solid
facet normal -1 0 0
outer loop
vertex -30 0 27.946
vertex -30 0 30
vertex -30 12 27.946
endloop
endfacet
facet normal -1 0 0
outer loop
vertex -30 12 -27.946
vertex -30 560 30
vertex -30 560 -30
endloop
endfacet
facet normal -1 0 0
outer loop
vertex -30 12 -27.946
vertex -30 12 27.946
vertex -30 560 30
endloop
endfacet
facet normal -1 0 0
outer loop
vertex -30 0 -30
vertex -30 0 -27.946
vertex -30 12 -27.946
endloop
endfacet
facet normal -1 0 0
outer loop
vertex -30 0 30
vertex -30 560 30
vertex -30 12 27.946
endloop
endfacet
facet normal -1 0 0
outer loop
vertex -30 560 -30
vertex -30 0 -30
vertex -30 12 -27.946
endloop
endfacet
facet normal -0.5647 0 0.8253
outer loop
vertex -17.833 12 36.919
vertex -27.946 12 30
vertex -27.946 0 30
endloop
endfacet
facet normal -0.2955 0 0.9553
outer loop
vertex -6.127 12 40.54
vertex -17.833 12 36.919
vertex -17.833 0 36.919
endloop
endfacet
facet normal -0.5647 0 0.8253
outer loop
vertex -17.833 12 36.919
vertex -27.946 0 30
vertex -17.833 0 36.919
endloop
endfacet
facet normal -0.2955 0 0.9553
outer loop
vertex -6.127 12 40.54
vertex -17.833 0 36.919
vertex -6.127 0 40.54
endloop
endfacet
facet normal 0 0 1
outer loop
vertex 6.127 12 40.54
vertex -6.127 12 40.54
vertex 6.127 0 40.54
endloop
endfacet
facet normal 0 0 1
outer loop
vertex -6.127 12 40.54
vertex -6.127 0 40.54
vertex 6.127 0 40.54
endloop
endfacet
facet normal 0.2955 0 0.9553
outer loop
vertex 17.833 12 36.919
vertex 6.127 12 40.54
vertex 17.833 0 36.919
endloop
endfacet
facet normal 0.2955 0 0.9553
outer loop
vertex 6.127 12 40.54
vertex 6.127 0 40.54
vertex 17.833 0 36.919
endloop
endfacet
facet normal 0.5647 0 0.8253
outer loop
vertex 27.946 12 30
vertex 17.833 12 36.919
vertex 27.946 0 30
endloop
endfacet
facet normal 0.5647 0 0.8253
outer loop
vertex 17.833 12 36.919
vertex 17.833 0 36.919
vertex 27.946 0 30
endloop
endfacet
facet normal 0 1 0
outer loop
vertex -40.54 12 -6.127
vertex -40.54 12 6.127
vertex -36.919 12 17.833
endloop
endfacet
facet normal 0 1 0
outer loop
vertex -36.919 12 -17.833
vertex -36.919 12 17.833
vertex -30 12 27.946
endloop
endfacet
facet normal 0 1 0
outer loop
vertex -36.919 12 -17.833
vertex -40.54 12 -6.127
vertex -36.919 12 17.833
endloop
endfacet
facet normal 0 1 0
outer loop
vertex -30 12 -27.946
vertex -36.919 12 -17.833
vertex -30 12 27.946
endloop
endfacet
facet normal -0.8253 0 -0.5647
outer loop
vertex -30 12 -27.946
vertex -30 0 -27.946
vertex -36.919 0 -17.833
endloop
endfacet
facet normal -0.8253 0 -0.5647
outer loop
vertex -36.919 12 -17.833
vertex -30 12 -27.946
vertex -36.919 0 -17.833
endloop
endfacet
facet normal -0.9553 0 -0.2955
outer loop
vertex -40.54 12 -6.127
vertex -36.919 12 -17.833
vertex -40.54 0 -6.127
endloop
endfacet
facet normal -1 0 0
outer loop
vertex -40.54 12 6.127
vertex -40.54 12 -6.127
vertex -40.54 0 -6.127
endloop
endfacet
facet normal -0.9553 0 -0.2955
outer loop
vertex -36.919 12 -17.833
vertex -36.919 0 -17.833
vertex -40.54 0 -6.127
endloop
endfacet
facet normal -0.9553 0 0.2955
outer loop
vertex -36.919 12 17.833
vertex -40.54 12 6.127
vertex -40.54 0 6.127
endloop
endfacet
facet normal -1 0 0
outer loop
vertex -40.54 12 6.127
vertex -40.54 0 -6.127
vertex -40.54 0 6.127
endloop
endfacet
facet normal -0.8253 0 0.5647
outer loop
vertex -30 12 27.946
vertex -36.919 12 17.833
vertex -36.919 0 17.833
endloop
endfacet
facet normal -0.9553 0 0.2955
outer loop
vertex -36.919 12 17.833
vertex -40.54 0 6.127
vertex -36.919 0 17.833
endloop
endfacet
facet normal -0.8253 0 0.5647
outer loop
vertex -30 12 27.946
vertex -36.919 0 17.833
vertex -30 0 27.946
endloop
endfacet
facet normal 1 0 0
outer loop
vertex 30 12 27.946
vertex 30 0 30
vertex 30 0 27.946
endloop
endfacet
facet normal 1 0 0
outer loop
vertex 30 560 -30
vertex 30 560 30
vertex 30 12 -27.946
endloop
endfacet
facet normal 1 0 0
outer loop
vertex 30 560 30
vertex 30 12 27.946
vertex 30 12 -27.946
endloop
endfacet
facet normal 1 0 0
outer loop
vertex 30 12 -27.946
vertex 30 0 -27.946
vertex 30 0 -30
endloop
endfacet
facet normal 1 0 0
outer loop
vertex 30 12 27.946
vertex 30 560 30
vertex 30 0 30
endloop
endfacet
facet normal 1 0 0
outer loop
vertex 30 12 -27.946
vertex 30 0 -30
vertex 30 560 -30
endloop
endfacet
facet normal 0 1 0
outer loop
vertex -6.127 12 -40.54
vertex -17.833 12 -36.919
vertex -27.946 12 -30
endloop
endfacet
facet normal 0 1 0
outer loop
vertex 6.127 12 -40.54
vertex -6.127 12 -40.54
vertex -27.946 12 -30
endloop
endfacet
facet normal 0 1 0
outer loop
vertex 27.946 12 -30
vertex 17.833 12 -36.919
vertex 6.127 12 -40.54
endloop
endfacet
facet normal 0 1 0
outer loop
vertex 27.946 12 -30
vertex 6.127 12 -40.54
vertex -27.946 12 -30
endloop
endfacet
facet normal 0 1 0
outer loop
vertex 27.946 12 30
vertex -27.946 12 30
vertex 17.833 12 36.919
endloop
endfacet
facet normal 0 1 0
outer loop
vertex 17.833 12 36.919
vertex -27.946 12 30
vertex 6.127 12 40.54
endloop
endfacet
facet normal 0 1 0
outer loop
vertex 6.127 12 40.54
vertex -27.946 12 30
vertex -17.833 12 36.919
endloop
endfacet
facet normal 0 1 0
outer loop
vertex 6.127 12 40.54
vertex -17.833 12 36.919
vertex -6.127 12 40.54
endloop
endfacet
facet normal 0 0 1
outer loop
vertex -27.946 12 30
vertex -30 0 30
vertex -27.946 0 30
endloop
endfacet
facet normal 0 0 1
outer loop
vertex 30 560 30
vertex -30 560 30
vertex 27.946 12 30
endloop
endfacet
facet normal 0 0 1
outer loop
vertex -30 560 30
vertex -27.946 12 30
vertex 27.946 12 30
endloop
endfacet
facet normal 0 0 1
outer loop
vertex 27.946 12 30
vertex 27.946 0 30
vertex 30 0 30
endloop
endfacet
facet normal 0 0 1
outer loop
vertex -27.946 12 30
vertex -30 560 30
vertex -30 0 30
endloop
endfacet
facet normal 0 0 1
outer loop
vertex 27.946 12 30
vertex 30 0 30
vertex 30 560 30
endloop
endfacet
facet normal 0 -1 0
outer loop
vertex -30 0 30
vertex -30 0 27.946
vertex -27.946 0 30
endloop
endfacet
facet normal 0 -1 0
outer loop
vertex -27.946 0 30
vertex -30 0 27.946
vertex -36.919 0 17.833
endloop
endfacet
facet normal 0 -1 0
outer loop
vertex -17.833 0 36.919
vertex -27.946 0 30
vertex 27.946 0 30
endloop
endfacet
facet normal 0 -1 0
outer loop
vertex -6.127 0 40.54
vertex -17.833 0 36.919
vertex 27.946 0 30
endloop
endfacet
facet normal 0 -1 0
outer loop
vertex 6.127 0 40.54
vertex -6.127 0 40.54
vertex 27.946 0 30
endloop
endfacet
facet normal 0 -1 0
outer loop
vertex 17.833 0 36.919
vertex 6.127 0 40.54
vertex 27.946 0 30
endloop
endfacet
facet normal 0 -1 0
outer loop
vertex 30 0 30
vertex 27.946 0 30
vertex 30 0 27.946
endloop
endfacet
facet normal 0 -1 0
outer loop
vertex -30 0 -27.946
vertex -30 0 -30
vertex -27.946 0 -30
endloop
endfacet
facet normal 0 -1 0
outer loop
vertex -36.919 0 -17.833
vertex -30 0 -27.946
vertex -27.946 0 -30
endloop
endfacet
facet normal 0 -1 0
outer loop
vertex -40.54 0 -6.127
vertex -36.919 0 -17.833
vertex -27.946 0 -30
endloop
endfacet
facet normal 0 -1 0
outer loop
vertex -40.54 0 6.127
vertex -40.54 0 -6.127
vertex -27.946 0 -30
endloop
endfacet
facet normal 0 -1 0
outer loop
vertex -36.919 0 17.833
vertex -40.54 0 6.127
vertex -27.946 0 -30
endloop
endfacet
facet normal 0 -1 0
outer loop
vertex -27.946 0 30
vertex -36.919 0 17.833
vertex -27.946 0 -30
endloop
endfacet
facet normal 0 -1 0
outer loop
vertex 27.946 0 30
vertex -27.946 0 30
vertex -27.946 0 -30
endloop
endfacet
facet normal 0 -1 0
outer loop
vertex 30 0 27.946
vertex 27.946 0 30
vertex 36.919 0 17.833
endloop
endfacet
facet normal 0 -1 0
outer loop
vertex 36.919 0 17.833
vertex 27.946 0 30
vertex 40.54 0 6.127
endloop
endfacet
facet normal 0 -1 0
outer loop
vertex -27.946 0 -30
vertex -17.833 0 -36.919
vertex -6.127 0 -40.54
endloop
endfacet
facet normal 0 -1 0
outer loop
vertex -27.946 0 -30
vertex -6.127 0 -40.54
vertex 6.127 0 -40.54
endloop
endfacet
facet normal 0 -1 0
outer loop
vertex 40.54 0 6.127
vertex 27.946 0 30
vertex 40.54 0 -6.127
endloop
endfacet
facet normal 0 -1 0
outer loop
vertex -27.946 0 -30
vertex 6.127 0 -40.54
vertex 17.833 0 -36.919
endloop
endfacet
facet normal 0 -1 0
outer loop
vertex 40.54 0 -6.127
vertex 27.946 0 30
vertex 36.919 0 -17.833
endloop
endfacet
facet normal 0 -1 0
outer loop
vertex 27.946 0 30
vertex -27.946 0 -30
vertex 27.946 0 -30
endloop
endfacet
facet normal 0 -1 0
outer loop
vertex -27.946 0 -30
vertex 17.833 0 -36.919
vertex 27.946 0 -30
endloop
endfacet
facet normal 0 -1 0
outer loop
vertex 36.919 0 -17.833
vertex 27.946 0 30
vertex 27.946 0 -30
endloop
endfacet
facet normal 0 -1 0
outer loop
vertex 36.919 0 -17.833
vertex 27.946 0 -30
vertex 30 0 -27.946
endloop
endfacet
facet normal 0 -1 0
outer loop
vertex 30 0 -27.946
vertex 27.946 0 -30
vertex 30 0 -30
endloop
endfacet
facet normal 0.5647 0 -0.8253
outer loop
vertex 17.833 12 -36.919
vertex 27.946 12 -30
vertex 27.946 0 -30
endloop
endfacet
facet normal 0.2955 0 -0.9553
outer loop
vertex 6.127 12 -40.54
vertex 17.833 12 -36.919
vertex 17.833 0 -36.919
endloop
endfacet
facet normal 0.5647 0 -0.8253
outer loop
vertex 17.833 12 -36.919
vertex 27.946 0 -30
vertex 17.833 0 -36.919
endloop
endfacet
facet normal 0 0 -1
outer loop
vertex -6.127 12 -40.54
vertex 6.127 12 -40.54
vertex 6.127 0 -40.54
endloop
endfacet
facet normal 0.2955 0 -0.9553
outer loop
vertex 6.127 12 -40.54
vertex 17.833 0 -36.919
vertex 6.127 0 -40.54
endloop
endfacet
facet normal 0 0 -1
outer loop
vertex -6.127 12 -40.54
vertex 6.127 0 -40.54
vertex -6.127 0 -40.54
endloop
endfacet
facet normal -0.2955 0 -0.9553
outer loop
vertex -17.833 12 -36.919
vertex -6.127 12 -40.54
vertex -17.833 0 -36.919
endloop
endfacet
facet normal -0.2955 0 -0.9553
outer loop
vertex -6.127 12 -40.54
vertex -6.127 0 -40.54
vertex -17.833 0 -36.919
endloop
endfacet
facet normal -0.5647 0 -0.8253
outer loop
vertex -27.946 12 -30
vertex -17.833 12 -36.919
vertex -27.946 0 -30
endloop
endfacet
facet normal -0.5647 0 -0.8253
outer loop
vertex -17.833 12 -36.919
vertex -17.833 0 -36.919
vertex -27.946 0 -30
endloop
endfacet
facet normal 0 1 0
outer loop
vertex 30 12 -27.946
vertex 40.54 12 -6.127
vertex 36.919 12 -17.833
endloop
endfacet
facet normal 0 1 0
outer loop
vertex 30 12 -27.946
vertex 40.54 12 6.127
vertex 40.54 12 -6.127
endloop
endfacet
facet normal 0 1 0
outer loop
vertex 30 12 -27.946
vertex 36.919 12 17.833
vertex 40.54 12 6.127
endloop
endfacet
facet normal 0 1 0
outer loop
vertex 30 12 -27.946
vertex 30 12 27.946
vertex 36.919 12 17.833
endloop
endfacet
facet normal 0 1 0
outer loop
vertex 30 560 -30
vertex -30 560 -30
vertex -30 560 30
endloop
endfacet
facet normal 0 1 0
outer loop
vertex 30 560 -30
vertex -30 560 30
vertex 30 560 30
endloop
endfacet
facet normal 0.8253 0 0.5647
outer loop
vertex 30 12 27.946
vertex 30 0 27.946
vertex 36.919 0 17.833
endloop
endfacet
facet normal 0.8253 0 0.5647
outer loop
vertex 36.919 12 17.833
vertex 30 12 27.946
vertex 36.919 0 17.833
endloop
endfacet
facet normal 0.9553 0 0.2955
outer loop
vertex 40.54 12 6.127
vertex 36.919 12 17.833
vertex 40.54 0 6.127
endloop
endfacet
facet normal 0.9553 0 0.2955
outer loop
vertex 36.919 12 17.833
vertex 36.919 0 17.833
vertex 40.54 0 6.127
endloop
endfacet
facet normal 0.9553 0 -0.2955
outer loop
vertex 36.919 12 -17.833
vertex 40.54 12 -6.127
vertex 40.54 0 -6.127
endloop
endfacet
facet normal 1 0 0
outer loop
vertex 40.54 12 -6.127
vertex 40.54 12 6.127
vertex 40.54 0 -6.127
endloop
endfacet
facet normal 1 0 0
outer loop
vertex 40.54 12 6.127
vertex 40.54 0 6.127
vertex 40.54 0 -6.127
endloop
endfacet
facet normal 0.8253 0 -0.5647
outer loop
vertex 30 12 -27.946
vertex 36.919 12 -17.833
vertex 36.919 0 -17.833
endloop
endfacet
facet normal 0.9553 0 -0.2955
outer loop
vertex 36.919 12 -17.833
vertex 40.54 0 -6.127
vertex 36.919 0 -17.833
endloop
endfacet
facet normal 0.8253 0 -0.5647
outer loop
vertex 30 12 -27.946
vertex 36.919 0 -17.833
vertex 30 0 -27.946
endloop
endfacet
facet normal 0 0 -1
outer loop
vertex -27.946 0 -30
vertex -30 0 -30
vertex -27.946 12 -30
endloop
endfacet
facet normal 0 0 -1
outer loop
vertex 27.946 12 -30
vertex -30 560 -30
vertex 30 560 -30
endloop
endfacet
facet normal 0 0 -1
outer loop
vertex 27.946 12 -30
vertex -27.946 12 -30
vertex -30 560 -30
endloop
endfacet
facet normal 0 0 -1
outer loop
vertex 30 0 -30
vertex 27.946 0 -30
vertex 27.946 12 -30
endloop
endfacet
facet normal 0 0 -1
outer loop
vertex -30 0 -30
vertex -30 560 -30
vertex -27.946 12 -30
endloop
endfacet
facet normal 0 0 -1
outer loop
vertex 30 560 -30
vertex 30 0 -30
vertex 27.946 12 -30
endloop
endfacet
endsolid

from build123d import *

# Parameters (mm, degrees)
F_01_HOUSING_PROFILE_W        = 60
F_01_HOUSING_PROFILE_H        = 60
F_01_HOUSING_BLOCK_DEPTH      = 560
F_02_FACE_BOSS_PROFILE_R      = 41
F_02_FACE_LOCATING_BOSS_DEPTH = 12


with BuildPart() as part:
    # 01_Housing_Profile → 01_Housing_Block (new body)
    with BuildSketch(Plane(origin=(0, 0, 0), x_dir=(1, 0, 0), z_dir=(0, 1, 0))):
        Rectangle(F_01_HOUSING_PROFILE_W, F_01_HOUSING_PROFILE_H)
    extrude(amount=F_01_HOUSING_BLOCK_DEPTH)

    # 02_Face_Boss_Profile → 02_Face_Locating_Boss (add)
    with BuildSketch(Plane(origin=(0, 0, 0), x_dir=(1, 0, 0), z_dir=(0, 1, 0))):
        Circle(F_02_FACE_BOSS_PROFILE_R)
    extrude(amount=F_02_FACE_LOCATING_BOSS_DEPTH)


solid = part.part
